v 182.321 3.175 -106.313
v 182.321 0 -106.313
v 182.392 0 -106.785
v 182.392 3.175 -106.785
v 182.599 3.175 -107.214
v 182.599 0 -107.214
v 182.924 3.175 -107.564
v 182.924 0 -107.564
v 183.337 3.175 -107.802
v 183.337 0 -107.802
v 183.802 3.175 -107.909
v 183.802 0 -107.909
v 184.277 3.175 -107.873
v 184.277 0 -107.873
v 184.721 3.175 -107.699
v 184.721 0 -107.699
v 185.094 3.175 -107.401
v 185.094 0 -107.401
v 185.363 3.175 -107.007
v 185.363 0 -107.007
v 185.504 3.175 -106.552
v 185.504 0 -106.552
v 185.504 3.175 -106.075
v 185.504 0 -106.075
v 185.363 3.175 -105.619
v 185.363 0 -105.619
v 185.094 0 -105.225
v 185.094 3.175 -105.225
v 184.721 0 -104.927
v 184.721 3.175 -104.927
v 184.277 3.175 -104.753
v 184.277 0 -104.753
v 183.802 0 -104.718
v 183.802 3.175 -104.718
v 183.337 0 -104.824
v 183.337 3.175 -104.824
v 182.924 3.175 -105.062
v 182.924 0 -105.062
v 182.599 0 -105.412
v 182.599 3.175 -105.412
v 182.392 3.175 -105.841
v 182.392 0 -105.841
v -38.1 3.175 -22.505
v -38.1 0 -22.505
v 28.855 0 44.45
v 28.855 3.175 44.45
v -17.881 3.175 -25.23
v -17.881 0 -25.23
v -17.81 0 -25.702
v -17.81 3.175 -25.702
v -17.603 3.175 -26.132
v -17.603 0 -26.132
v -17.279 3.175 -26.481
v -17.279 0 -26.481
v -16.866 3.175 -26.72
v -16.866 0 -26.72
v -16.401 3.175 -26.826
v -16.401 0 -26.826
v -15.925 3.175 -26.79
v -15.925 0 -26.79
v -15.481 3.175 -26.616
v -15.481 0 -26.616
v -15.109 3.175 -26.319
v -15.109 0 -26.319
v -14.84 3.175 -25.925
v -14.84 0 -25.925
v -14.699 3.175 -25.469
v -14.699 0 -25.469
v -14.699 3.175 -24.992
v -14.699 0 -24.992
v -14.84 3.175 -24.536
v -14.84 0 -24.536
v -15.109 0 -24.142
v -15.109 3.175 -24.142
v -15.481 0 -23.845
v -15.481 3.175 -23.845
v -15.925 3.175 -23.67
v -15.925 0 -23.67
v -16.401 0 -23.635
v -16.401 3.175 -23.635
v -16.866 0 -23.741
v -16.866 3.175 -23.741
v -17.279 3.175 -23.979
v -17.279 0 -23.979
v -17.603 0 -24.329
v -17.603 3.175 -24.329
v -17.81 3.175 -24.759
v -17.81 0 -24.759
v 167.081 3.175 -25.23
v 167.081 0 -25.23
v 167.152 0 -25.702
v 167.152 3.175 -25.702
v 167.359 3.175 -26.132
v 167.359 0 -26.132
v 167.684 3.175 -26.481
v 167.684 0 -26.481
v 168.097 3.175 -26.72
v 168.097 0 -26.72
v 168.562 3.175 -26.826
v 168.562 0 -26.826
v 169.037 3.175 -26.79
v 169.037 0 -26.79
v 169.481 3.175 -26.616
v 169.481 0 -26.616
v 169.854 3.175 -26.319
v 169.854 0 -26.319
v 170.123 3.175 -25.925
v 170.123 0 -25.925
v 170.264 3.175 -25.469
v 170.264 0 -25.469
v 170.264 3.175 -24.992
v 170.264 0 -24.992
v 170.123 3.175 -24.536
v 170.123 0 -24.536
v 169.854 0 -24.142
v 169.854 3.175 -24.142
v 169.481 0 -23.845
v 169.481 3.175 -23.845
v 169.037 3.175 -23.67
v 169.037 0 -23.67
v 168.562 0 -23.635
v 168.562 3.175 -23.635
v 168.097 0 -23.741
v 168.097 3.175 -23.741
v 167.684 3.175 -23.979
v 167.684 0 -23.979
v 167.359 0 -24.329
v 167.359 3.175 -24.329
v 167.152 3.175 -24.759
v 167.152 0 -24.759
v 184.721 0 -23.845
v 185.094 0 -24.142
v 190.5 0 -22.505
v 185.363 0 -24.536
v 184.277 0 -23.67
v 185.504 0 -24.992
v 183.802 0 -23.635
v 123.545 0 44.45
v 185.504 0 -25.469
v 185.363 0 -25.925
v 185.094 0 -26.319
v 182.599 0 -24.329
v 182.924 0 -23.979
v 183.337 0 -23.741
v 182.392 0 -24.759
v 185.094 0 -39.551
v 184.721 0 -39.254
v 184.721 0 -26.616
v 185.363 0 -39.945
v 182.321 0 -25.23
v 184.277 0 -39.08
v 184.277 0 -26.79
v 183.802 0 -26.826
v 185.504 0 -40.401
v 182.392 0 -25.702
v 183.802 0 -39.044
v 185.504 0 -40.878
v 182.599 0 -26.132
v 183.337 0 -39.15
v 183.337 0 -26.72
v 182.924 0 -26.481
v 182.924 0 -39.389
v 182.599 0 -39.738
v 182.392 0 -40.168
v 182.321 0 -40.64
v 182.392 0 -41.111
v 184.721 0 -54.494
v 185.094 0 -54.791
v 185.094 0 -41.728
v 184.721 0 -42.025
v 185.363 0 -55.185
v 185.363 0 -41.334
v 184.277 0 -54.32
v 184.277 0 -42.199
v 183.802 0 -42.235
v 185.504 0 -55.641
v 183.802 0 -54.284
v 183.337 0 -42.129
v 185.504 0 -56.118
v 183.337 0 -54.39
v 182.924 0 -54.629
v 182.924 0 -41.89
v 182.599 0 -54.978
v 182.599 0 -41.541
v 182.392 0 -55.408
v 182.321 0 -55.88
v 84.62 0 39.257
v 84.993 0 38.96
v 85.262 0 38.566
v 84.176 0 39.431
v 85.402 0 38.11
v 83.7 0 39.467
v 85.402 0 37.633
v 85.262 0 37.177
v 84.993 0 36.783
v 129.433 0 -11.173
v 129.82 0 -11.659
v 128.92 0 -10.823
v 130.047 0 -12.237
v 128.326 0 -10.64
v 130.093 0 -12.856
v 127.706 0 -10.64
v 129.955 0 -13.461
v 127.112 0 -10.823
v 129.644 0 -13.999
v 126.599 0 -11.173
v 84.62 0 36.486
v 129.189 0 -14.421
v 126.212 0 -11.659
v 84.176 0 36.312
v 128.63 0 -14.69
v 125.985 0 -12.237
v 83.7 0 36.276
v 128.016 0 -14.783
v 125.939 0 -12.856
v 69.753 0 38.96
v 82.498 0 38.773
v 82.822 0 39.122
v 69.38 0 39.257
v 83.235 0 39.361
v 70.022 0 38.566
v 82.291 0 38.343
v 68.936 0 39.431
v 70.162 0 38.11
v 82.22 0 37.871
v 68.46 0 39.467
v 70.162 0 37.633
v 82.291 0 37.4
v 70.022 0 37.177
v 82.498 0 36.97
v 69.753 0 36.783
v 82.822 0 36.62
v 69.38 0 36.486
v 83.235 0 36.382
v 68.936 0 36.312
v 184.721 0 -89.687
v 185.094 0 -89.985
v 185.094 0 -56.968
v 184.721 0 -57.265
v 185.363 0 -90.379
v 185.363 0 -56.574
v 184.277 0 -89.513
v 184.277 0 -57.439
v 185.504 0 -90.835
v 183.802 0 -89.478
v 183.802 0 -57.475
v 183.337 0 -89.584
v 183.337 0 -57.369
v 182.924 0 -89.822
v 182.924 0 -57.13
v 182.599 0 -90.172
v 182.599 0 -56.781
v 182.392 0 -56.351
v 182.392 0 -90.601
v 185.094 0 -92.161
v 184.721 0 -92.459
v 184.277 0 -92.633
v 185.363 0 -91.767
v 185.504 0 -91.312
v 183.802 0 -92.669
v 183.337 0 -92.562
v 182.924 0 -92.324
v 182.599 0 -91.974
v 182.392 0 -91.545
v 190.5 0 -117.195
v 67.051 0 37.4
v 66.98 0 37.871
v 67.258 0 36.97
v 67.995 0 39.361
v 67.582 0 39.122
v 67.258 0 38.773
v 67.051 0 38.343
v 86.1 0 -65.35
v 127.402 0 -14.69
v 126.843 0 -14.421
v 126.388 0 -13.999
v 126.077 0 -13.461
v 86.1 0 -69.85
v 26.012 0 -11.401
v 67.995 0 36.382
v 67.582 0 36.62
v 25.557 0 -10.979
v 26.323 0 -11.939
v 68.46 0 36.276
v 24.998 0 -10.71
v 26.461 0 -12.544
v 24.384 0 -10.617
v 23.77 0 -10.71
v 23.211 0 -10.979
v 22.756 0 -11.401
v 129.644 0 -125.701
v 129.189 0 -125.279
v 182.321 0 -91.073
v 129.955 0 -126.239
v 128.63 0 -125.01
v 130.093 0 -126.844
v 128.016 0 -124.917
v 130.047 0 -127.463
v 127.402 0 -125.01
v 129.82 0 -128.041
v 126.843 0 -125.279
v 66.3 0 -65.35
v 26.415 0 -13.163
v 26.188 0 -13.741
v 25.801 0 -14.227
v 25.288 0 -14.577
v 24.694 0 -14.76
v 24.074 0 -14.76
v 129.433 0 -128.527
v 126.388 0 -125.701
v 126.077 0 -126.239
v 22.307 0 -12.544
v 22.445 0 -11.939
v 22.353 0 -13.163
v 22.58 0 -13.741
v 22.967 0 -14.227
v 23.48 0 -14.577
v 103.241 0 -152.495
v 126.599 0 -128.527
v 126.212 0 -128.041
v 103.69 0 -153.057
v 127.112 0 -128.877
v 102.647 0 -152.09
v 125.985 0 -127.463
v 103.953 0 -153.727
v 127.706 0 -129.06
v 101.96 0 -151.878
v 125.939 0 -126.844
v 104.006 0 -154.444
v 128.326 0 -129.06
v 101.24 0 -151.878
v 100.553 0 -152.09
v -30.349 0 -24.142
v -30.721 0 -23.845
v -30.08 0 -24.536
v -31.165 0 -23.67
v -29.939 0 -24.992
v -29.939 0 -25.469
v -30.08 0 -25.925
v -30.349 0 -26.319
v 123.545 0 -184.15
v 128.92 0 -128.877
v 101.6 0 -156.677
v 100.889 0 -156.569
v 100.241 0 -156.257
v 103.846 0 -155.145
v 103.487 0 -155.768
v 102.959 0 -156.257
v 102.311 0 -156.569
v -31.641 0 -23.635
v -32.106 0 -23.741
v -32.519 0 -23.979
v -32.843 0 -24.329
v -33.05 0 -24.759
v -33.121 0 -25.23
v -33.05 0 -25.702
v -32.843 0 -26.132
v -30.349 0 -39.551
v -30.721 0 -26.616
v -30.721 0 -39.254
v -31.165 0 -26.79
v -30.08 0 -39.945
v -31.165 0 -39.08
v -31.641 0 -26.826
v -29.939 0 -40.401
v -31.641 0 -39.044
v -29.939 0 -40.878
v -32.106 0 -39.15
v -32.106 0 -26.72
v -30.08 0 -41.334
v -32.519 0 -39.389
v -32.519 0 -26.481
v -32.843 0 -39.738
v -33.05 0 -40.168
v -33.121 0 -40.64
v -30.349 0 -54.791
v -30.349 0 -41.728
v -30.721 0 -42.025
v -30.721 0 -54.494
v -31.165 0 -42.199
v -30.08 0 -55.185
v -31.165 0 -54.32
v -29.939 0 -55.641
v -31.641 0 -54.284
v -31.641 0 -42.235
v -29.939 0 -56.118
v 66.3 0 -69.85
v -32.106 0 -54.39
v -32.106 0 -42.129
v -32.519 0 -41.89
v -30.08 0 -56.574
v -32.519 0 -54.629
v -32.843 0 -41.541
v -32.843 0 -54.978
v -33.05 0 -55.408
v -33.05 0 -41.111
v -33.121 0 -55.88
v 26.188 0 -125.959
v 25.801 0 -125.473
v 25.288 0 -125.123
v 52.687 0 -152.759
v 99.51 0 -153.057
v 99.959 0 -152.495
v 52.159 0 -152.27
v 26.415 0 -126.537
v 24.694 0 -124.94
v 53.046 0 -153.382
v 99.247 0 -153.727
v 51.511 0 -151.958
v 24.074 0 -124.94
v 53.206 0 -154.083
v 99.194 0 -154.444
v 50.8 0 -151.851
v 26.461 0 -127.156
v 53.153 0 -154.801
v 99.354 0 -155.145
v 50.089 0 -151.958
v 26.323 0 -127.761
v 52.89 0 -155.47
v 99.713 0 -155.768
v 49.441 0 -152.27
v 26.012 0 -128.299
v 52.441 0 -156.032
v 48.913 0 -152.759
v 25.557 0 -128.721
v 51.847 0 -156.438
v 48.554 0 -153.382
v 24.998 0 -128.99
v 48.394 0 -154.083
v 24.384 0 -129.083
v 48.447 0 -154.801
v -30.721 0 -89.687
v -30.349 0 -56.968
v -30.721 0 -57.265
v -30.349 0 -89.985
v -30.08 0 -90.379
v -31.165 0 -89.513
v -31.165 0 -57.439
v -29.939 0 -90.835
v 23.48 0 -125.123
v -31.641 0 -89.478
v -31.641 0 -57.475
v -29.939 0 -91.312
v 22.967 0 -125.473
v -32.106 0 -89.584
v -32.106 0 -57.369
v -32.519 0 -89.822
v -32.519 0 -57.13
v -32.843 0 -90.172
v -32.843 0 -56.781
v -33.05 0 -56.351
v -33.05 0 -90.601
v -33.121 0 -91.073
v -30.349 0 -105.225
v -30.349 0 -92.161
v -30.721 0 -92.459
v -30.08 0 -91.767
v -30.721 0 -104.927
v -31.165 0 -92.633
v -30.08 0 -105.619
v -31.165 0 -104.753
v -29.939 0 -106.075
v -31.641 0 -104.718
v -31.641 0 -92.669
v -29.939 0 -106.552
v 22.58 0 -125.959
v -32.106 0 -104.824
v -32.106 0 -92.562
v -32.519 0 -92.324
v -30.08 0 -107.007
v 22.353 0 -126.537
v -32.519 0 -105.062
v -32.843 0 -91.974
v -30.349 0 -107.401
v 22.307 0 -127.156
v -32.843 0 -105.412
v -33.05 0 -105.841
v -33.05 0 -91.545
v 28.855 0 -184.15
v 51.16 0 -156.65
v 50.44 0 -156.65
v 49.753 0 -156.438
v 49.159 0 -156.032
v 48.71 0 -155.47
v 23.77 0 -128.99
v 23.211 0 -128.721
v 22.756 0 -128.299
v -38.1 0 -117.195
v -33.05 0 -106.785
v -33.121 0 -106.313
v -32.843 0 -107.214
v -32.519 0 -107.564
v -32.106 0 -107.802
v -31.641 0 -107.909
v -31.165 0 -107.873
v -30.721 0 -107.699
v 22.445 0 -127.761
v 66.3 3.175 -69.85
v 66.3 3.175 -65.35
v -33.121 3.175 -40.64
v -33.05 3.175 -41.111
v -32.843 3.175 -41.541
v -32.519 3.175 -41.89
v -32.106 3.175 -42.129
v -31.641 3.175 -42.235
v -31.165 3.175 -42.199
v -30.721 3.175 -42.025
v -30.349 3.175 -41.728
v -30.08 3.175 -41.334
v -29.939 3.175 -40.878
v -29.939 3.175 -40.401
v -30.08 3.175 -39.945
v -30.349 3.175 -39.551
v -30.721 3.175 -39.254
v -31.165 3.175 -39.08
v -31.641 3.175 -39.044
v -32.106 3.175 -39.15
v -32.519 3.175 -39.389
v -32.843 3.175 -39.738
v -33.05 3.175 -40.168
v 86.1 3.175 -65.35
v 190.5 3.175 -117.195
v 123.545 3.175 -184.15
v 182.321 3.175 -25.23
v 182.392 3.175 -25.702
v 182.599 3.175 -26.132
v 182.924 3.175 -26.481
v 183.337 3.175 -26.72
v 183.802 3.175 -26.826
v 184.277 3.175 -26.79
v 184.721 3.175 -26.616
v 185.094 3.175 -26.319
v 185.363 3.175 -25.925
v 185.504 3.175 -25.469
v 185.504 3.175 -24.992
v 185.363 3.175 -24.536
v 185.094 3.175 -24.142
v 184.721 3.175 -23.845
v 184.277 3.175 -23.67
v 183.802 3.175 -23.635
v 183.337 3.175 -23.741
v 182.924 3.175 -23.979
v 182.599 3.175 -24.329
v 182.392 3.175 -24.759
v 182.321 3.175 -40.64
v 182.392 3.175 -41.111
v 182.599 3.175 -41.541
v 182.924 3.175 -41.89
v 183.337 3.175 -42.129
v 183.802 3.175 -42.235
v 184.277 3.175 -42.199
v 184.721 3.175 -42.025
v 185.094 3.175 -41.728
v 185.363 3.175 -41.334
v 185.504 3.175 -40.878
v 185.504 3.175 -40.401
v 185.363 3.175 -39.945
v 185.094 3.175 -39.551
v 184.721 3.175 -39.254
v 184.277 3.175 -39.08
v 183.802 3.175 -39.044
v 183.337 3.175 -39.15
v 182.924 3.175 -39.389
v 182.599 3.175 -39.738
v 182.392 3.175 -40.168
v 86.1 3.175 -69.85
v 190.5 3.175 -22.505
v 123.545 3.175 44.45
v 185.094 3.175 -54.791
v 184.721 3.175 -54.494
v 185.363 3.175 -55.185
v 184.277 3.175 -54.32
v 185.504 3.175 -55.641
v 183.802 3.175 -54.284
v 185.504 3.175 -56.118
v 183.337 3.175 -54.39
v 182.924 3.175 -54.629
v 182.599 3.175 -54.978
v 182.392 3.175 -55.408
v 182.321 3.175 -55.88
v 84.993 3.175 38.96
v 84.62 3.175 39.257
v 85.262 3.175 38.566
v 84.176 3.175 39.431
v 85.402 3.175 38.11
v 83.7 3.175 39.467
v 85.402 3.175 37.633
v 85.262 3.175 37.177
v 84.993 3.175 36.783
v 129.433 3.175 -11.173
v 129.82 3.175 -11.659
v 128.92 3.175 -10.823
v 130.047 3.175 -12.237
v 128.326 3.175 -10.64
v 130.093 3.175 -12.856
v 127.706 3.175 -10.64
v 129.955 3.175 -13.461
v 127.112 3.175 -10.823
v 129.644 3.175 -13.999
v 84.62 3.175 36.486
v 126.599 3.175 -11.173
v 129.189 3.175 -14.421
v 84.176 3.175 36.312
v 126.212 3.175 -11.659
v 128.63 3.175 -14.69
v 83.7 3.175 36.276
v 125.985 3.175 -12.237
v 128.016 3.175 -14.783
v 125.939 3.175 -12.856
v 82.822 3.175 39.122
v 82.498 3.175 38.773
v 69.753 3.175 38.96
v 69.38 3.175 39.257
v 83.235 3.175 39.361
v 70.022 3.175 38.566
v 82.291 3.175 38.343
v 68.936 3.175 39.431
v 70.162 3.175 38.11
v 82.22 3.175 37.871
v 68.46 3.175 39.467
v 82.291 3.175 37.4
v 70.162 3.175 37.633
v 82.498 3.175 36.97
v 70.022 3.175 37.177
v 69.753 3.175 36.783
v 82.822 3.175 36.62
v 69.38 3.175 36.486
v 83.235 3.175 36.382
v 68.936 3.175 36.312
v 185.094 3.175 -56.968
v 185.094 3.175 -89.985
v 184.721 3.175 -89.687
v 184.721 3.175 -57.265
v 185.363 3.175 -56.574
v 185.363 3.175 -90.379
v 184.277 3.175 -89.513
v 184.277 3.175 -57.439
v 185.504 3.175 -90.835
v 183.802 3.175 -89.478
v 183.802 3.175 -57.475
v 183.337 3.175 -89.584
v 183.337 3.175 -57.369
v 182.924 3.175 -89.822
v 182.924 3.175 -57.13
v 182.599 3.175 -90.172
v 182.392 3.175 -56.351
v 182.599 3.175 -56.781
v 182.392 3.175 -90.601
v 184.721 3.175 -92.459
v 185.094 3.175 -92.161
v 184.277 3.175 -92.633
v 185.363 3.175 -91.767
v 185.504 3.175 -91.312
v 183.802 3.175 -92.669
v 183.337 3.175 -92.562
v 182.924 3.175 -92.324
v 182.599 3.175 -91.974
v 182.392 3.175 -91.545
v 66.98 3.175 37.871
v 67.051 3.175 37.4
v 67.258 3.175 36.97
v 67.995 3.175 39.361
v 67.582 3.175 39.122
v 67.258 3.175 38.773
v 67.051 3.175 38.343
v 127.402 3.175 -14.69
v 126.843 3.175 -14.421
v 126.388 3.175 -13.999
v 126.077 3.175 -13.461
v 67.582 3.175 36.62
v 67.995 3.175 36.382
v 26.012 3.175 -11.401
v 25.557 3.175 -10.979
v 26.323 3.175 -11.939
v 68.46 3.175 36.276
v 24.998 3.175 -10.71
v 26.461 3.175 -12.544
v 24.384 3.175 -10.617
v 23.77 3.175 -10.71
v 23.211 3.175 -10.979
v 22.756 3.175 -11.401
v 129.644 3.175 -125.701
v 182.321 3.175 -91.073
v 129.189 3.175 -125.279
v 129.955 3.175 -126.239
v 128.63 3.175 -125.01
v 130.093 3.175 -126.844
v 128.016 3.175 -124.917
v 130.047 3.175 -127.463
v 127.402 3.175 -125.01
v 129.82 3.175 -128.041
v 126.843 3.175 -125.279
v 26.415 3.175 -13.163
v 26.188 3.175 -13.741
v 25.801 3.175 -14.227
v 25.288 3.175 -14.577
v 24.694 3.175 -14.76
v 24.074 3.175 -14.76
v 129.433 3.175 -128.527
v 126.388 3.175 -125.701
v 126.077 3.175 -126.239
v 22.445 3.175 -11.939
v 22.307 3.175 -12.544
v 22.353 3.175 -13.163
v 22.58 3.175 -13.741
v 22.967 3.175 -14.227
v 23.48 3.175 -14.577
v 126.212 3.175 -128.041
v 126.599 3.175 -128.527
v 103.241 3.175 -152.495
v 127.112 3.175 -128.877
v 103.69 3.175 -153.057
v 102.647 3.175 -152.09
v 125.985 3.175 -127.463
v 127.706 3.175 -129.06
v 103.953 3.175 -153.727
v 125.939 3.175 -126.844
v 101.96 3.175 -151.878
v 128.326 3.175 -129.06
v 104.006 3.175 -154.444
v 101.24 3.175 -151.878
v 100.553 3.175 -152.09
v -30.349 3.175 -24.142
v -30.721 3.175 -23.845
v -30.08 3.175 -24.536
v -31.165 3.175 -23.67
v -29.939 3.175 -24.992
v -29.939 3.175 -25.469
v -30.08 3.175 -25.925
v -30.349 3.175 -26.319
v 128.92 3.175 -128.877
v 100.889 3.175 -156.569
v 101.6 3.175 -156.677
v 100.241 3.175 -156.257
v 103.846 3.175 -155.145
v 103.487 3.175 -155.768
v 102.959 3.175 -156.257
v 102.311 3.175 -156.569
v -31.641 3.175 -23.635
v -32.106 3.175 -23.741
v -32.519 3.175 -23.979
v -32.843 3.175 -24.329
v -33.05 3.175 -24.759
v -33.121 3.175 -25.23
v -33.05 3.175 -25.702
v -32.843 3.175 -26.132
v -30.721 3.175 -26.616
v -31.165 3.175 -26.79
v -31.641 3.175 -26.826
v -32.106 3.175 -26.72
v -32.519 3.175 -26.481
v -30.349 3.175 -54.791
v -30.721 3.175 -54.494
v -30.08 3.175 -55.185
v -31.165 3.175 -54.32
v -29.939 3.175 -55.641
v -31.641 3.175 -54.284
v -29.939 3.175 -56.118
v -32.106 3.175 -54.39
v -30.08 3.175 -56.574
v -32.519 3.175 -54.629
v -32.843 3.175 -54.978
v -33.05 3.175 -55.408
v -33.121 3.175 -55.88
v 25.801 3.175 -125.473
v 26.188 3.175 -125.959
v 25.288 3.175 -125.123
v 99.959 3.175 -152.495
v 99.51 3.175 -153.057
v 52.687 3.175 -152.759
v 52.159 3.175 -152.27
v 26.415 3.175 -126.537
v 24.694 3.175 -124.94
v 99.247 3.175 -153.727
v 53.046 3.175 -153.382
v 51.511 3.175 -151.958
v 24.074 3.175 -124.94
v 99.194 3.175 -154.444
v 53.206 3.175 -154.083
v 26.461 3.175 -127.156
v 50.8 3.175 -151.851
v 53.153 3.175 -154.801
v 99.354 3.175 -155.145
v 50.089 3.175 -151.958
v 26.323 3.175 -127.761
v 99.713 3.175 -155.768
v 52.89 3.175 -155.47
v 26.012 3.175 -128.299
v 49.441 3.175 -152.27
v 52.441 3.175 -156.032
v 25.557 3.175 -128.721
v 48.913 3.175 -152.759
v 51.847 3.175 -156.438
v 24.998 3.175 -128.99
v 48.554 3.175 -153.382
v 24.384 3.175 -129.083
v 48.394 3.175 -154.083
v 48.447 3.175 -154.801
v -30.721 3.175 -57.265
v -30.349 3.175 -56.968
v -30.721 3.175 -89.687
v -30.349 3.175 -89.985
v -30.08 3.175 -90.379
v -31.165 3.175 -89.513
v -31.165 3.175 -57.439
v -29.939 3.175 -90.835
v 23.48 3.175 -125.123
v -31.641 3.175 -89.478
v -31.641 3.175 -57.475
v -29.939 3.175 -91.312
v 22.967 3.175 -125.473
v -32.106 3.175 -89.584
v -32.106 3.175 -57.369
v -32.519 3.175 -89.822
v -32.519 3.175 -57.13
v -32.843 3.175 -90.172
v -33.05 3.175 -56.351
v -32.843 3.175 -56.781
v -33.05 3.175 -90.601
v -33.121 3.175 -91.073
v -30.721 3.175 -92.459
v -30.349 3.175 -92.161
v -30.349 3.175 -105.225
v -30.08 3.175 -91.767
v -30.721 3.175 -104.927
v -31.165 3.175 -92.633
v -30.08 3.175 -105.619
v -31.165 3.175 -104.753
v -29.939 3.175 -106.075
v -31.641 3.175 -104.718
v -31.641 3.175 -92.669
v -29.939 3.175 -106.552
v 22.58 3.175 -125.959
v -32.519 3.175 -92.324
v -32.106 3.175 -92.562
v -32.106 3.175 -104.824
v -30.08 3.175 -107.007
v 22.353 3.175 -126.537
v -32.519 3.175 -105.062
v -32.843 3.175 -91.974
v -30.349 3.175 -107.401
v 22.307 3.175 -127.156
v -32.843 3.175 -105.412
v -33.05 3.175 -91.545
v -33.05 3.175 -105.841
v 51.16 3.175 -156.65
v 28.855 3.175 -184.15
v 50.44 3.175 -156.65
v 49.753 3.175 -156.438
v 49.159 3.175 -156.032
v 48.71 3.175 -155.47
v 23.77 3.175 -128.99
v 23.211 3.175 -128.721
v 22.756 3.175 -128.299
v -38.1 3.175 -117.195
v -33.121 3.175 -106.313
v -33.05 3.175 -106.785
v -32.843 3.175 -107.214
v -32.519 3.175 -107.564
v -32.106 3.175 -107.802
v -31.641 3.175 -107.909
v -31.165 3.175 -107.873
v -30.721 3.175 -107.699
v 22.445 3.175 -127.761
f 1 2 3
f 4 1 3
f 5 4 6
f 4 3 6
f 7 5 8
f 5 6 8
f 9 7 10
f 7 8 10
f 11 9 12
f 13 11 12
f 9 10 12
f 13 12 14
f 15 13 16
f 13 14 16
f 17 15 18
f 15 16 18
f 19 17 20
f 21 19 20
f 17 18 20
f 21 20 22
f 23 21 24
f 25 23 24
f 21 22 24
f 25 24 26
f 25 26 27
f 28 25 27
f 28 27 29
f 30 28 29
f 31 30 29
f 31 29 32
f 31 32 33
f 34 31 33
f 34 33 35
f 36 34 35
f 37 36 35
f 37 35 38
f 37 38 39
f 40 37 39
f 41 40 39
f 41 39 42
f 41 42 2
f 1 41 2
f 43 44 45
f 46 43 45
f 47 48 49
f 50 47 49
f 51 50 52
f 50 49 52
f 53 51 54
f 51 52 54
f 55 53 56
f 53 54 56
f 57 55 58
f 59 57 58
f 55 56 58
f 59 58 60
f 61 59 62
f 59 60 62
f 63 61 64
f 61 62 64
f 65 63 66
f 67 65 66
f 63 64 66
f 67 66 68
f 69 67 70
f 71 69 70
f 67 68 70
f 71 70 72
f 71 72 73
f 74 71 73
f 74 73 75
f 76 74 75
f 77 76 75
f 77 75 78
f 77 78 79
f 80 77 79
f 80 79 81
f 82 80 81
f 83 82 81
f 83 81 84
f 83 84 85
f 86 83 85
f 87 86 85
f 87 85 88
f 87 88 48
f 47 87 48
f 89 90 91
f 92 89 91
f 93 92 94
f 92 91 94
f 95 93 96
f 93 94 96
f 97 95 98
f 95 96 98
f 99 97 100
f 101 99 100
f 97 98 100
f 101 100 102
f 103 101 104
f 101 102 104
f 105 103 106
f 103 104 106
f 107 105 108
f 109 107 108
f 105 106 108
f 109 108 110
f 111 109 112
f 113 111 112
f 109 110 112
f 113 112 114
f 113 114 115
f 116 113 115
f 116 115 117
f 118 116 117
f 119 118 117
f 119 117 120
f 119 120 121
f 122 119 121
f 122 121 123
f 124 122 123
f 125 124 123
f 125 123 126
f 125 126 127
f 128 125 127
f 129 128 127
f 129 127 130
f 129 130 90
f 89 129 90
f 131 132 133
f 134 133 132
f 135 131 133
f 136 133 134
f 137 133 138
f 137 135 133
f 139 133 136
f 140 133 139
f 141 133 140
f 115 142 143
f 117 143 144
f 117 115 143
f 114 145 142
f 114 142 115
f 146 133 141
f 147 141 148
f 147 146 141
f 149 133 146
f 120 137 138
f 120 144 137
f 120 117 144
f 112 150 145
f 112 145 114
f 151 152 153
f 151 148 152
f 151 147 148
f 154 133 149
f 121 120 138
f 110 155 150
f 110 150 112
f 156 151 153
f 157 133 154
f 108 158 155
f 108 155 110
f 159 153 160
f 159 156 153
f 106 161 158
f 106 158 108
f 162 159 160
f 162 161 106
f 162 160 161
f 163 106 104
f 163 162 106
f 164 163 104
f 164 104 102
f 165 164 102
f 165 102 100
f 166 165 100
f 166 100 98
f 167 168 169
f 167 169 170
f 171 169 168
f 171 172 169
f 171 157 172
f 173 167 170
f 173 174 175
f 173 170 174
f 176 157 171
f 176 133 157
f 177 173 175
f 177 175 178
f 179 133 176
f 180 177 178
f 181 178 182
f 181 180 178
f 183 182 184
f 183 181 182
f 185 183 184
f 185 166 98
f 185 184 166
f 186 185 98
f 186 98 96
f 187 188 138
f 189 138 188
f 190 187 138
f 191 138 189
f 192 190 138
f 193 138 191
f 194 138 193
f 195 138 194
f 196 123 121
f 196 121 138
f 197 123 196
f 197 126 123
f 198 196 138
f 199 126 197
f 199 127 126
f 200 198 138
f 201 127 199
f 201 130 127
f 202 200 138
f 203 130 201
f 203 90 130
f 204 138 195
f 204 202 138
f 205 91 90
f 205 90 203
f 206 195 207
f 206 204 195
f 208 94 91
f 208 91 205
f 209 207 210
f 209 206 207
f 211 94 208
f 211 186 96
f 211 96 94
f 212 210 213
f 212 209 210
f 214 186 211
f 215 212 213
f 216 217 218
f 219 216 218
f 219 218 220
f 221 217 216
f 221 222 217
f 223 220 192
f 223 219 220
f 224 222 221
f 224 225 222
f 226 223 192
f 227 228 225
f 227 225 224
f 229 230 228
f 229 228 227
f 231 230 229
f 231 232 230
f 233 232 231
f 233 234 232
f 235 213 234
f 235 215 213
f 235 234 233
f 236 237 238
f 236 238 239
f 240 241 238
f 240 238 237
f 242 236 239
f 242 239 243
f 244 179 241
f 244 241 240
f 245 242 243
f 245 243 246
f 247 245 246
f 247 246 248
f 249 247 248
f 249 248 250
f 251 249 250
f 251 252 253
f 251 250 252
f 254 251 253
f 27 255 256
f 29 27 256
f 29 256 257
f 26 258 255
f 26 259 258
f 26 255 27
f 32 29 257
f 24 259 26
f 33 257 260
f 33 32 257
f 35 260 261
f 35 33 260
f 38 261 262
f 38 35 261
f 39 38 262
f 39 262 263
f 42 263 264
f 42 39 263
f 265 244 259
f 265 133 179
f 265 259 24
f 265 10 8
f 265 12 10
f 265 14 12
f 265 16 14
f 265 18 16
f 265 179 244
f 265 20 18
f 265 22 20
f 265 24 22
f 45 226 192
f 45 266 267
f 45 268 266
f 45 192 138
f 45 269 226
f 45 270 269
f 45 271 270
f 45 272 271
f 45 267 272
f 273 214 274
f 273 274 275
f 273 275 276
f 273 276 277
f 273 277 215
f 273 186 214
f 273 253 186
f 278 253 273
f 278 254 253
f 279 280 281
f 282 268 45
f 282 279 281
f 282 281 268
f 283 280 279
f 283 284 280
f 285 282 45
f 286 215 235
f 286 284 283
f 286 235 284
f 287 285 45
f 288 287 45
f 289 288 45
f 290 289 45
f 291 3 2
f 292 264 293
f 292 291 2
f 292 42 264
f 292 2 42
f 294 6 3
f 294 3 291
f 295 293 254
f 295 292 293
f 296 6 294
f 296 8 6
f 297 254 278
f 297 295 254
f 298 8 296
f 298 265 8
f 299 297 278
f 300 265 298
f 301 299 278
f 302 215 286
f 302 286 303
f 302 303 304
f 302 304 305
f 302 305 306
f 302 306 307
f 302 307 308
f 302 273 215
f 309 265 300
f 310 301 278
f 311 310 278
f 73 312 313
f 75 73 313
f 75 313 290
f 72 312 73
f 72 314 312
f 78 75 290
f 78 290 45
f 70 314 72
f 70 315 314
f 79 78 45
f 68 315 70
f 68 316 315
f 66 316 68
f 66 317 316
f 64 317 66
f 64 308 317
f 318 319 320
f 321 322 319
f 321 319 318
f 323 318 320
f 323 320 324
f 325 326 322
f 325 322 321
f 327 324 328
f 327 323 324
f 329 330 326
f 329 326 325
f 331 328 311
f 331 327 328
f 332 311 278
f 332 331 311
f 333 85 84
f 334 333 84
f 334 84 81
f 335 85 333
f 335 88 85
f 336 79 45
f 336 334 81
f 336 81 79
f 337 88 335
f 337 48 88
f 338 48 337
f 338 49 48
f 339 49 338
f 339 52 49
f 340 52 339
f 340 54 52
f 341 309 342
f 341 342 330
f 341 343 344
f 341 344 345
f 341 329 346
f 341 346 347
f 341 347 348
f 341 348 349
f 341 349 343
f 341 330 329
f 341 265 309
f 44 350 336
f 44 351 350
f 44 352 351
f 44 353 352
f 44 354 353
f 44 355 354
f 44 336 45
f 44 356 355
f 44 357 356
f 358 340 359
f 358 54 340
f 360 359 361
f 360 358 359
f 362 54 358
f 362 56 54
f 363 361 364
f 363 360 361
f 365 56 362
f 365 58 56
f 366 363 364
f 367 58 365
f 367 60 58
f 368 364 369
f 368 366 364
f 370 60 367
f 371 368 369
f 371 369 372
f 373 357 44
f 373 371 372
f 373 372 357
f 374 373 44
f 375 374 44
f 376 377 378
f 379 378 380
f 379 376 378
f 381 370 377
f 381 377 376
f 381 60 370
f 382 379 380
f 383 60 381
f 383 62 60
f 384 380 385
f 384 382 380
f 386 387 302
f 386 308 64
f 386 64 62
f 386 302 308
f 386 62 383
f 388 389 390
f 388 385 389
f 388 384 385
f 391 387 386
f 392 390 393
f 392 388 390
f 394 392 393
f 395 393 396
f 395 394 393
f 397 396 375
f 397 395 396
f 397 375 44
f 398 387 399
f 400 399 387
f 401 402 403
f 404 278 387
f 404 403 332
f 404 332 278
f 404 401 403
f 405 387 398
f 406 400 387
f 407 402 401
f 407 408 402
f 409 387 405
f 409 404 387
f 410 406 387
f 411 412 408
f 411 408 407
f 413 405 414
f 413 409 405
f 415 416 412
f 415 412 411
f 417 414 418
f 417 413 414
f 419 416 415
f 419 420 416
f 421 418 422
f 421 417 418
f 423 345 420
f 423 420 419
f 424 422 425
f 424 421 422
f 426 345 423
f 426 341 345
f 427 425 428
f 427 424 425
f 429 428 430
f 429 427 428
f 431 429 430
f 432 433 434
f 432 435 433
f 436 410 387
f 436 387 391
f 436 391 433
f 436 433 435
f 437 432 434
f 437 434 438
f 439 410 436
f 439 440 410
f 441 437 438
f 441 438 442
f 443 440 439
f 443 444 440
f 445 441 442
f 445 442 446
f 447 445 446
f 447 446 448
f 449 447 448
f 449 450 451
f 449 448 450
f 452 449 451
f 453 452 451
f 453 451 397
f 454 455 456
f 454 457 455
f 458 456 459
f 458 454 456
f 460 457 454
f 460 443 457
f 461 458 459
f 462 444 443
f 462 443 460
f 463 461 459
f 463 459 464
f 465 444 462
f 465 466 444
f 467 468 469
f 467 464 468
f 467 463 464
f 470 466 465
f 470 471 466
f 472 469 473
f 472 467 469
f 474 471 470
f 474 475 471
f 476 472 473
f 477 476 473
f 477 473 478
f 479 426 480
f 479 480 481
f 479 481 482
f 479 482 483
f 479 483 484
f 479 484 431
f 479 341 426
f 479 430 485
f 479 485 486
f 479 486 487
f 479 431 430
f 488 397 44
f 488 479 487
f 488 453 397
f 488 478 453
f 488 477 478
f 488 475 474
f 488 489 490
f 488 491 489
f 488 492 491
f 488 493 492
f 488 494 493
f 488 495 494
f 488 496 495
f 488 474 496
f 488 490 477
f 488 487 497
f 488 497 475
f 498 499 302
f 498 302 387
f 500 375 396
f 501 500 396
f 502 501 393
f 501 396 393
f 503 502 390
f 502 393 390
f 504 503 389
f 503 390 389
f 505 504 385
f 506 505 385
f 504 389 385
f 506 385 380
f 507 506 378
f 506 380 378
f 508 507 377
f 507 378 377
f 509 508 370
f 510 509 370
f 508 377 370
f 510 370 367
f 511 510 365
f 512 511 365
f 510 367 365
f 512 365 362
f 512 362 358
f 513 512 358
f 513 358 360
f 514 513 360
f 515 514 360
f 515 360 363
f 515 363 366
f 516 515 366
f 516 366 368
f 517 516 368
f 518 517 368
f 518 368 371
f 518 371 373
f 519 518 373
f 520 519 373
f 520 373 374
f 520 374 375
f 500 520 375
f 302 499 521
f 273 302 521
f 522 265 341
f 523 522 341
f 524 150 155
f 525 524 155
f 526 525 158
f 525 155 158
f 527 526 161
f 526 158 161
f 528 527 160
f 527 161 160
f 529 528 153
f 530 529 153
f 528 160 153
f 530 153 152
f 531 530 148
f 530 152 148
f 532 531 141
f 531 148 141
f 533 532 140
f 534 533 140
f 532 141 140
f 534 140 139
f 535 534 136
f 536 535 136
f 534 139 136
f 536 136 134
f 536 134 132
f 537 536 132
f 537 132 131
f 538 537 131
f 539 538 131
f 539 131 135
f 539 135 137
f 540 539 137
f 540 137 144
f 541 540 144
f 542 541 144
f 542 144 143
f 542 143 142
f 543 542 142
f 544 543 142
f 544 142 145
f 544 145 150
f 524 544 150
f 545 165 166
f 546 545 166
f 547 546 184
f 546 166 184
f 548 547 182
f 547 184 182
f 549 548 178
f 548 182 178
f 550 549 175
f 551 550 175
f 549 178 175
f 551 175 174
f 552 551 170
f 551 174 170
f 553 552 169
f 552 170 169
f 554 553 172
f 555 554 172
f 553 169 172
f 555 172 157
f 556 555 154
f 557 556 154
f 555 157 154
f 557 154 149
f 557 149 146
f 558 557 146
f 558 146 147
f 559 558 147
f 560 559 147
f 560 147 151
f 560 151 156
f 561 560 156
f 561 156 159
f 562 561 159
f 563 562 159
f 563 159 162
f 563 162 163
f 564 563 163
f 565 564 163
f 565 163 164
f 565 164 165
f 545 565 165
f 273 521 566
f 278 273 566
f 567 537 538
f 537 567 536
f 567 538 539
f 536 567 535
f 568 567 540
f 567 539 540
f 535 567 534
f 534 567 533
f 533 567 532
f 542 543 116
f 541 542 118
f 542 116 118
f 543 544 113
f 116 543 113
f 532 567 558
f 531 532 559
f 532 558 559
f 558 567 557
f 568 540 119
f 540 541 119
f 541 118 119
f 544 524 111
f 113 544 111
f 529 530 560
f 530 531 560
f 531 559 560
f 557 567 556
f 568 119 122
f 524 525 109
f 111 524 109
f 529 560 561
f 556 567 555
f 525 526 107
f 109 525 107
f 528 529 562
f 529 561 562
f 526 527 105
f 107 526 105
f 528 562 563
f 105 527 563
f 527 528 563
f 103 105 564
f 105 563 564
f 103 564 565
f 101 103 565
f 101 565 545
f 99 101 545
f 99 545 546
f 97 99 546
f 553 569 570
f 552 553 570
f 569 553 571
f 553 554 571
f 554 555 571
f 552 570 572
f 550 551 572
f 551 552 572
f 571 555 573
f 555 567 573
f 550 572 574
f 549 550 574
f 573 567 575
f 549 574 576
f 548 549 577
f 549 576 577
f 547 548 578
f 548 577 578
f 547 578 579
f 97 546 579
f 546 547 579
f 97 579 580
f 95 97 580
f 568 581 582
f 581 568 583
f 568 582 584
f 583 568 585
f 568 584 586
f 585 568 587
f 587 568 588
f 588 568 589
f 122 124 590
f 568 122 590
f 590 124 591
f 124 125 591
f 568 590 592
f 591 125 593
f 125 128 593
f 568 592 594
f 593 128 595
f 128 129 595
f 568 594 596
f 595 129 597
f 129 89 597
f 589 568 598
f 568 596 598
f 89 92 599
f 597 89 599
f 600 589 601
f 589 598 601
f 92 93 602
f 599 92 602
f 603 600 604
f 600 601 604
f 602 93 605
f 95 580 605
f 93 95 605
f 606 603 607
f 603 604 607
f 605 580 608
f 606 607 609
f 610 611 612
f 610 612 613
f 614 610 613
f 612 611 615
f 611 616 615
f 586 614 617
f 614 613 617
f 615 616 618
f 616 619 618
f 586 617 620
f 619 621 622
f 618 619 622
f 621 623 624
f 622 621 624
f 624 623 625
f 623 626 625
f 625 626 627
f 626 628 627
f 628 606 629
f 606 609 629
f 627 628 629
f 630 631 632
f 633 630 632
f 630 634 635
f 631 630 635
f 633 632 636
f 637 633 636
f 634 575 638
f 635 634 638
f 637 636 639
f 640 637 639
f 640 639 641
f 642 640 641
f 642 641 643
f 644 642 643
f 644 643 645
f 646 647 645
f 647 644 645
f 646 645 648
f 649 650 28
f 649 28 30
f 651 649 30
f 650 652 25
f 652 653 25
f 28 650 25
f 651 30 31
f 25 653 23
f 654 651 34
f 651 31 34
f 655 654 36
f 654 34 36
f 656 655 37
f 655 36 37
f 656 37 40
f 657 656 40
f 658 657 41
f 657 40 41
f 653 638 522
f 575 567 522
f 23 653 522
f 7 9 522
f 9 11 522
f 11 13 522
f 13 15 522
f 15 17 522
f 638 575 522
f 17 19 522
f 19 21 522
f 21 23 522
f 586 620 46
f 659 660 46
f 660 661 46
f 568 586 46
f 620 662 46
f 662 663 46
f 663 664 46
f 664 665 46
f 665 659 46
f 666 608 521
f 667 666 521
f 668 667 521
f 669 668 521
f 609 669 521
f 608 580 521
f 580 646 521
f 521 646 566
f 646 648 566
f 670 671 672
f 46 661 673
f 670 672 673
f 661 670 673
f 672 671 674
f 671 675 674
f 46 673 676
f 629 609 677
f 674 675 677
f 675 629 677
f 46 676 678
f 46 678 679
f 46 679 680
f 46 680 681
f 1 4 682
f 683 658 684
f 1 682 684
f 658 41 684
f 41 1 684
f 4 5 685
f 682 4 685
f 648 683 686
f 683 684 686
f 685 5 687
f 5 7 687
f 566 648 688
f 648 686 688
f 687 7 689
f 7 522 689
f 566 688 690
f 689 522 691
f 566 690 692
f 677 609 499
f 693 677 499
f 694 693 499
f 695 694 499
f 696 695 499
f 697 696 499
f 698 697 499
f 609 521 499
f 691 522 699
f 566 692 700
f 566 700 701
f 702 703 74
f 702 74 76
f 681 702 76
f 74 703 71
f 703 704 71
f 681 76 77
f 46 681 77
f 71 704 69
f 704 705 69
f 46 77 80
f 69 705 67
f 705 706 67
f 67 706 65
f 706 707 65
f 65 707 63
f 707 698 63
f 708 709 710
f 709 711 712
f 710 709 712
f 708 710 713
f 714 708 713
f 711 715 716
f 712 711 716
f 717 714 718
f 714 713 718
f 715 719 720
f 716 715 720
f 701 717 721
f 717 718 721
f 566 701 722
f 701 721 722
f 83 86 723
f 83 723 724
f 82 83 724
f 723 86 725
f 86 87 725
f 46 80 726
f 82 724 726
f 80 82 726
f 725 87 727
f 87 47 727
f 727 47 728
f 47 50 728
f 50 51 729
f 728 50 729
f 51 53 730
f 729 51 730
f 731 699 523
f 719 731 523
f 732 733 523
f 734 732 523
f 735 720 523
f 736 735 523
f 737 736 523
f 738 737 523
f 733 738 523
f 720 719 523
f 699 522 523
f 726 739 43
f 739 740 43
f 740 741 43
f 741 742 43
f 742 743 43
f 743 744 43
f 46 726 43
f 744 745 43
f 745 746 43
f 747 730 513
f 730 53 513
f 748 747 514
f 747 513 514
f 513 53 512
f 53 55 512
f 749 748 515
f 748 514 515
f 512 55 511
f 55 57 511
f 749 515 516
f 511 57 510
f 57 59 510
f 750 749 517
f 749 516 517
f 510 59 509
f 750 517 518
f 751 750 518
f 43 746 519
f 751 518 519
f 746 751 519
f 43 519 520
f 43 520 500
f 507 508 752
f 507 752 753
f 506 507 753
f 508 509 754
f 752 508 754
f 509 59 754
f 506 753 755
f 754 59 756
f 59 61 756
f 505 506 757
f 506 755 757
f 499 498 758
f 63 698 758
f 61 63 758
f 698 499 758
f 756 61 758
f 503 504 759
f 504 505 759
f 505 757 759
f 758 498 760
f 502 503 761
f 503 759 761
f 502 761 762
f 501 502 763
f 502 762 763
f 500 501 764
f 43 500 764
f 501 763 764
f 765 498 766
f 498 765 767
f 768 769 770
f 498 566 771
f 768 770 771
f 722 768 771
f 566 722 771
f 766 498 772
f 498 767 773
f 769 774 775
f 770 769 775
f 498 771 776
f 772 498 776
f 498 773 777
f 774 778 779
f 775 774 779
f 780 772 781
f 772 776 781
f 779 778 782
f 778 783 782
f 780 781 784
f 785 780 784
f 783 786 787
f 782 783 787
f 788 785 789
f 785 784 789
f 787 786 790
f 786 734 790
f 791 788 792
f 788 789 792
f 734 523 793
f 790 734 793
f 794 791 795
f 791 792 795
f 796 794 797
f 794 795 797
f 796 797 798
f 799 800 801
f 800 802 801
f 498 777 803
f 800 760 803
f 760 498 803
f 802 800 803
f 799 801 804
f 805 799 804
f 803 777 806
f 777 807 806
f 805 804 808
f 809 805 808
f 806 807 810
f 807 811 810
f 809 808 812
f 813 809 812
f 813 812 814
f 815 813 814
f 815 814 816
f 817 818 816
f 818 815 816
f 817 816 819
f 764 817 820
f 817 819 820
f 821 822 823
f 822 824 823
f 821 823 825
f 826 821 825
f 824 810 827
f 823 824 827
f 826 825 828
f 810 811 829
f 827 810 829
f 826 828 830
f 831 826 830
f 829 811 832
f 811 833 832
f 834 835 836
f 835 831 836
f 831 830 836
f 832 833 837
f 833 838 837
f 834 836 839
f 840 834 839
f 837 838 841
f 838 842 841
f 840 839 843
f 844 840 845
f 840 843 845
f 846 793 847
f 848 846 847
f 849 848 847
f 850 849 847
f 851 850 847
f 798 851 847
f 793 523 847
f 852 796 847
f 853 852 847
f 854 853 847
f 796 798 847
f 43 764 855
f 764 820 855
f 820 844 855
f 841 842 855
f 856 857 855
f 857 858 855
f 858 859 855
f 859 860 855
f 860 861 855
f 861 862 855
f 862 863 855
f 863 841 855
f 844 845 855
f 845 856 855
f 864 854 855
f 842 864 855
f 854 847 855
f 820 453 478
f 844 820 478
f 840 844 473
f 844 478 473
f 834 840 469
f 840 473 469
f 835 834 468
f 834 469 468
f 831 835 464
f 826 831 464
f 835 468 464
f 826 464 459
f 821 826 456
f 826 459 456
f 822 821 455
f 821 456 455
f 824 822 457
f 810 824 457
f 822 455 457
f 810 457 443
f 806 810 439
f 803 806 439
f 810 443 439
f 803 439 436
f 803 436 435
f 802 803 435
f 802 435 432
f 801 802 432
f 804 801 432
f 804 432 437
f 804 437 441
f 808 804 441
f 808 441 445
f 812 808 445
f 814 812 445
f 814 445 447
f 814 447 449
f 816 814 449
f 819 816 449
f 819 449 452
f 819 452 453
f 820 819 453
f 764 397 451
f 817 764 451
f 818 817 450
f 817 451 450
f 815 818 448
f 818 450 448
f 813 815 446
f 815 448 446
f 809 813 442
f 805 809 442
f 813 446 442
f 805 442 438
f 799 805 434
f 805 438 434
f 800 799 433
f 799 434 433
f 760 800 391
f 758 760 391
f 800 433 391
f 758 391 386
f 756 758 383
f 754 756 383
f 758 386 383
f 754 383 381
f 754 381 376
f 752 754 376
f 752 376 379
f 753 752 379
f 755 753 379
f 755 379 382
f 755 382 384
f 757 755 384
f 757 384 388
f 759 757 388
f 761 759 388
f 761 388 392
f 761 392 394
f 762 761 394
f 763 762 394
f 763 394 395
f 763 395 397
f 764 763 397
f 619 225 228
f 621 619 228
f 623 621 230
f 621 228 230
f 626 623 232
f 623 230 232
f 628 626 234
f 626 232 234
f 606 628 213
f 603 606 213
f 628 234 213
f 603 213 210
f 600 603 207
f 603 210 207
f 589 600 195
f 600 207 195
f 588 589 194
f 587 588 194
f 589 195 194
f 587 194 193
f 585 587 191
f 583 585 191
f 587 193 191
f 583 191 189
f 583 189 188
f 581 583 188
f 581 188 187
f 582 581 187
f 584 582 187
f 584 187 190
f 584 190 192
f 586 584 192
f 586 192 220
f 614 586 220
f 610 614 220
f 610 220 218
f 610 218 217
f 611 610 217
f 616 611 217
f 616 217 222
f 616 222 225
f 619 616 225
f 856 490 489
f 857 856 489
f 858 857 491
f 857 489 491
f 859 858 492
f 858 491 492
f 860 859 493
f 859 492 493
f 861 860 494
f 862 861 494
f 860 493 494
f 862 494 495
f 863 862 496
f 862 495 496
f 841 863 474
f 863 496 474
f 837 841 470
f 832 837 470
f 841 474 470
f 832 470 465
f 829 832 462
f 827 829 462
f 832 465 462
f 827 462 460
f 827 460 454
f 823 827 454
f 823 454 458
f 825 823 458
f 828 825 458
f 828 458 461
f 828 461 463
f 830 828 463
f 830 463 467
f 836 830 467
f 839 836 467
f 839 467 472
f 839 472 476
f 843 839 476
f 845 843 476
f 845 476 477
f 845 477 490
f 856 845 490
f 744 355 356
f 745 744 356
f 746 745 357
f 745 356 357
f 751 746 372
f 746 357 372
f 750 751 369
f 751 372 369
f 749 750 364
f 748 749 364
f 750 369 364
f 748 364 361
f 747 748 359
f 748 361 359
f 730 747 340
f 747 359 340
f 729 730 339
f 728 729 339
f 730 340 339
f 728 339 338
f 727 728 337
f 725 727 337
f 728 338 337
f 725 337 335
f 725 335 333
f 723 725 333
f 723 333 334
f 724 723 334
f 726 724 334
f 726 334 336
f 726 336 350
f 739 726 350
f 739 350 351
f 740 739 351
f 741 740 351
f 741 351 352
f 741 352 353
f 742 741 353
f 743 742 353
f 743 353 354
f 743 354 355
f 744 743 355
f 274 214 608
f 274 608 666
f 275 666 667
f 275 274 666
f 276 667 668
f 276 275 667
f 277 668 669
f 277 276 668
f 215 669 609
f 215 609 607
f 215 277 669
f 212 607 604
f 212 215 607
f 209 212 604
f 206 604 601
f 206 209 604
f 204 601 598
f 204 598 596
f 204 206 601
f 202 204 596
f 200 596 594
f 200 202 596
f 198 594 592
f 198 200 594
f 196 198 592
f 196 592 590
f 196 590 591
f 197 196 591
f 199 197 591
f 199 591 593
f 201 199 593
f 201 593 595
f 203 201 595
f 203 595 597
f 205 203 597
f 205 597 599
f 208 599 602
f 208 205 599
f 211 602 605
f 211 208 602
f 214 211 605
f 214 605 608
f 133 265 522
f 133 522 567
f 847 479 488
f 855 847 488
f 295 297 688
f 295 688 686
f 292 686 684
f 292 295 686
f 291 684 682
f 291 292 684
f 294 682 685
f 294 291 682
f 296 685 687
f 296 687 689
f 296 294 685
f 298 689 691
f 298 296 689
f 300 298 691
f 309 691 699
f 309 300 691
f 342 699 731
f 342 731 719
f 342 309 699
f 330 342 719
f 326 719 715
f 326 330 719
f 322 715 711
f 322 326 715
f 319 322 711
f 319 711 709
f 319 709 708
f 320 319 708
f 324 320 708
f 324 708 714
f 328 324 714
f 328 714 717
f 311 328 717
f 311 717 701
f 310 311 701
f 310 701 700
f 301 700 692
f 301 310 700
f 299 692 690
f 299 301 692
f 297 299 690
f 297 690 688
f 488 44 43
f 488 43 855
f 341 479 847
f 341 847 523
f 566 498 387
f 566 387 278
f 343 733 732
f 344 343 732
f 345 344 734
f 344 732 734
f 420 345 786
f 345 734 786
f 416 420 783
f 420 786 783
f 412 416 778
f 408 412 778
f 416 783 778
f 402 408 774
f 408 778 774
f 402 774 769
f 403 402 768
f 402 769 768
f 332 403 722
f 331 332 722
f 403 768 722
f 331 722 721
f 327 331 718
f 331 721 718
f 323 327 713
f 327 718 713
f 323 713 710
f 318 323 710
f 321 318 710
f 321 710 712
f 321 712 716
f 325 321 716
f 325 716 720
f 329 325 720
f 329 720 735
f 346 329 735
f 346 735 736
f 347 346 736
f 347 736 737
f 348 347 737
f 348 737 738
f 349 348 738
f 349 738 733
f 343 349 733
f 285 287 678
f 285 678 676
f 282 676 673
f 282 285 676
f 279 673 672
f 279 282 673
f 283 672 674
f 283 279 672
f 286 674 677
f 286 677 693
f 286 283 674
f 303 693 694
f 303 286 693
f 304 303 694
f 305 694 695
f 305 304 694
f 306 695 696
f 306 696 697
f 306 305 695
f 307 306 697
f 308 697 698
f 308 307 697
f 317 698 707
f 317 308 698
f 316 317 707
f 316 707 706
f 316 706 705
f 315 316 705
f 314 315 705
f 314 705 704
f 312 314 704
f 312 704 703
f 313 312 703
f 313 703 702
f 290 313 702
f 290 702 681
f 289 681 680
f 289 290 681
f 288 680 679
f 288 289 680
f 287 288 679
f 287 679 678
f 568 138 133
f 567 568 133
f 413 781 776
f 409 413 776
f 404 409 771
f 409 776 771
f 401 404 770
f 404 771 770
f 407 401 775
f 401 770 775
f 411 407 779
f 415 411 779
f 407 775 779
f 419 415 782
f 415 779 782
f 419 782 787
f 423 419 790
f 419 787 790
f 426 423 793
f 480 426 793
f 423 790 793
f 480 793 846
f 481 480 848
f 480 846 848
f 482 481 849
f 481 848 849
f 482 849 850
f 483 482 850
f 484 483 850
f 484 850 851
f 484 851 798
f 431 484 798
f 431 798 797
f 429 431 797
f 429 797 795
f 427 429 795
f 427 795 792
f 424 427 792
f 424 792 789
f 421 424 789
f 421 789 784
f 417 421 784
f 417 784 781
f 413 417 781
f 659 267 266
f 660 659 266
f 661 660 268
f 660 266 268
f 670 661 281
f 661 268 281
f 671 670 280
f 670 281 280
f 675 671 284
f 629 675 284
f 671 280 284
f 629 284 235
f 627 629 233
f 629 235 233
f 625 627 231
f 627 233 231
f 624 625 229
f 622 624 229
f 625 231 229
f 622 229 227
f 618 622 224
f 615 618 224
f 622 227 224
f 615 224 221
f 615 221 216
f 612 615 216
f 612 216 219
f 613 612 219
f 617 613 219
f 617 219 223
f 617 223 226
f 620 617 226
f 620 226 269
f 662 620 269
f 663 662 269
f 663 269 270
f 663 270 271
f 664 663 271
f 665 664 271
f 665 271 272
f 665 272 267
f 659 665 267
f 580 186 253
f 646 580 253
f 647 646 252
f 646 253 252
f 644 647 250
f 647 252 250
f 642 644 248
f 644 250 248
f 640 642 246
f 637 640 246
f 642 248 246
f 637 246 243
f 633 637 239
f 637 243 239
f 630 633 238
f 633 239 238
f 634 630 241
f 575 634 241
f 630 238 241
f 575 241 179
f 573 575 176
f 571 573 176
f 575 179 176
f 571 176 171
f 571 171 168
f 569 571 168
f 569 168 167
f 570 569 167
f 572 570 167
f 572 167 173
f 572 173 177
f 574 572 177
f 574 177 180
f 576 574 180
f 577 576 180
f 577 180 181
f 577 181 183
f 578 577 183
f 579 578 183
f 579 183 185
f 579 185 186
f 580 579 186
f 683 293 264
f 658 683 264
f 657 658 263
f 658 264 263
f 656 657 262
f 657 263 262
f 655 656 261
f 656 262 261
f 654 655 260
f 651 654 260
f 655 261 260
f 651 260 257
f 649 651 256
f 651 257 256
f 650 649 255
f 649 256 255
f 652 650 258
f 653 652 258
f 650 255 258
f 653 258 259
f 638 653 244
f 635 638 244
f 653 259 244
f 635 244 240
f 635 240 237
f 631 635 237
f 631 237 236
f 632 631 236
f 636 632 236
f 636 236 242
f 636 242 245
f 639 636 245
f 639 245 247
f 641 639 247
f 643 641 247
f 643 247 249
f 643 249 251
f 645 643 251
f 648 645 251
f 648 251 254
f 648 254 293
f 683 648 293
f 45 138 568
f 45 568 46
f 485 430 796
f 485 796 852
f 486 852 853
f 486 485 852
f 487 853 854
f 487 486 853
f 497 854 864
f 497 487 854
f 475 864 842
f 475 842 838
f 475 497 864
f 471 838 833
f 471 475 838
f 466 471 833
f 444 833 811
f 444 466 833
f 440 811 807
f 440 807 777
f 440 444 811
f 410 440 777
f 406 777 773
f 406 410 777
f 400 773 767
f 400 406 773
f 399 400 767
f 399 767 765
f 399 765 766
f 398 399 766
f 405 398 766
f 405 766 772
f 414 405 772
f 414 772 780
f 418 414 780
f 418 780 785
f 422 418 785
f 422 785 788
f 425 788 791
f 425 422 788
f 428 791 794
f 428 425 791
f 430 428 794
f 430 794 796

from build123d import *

# Parameters (mm, degrees)
SKETCH1_R            = 2.0828
BOSS_EXTRUDE1_DEPTH  = 3.175
M3_CLEARANCE_HOLE1_D = 3.2
SKETCH5_W            = 19.8
SKETCH5_H            = 4.5
CUT_EXTRUDE1_DEPTH   = 265.974627323
SKETCH7_R            = 2.413
CUT_EXTRUDE2_DEPTH   = 265.974627323


with BuildPart() as part:
    # Sketch1 → Boss-Extrude1 (new body)
    with BuildSketch(Plane(origin=(0, 0, 0), x_dir=(1, 0, 0), z_dir=(0, 1, 0))):
        Polygon((28.855389821, 184.15), (123.544610179, 184.15), (176.5, 131.194610179), (182.5, 125.194610179), (190.5, 117.194610179), (190.5, 22.505389821), (182.5, 14.505389821), (176.5, 8.505389821), (137.544610179, -30.45), (131.544610179, -36.45), (123.544610179, -44.45), (28.855389821, -44.45), (20.855389821, -36.45), (14.855389821, -30.45), (-24.1, 8.505389821), (-30.1, 14.505389821), (-38.1, 22.505389821), (-38.1, 117.194610179), (-30.1, 125.194610179), (-24.1, 131.194610179), align=None)
        with Locations(Location((24.384, 12.7, 0), (0, 0, 270))):
            Circle(SKETCH1_R, mode=Mode.SUBTRACT)
        with Locations(Location((128.016, 12.7, 0), (0, 0, 90))):
            Circle(SKETCH1_R, mode=Mode.SUBTRACT)
        with Locations(Location((128.016, 127, 0), (0, 0, 270))):
            Circle(SKETCH1_R, mode=Mode.SUBTRACT)
        with Locations(Location((24.384, 127, 0), (0, 0, 90))):
            Circle(SKETCH1_R, mode=Mode.SUBTRACT)
    extrude(amount=BOSS_EXTRUDE1_DEPTH)

    # M3 Clearance Hole1 (through all)
    with Locations(Plane(origin=(0, 3.175, 0), x_dir=(1, 0, 0), z_dir=(0, 1, 0))):
        with Locations((-31.5214, 106.313101446), (-31.5214, 91.073101446), (-31.5214, 55.8795536), (-31.5214, 40.6395536), (-31.5214, 25.230335162), (-16.2814, 25.230335162), (68.58, -37.8714), (83.82, -37.8714), (183.9214, 25.230335162), (168.6814, 25.230335162), (183.9214, 40.6395536), (183.9214, 55.8795536), (183.9214, 91.073101446), (183.9214, 106.313101446)):
            Hole(M3_CLEARANCE_HOLE1_D / 2)

    # Sketch5 → Cut-Extrude1 (cut, through all)
    with BuildSketch(Plane(origin=(0, 3.175, 0), x_dir=(1, 0, 0), z_dir=(0, 1, 0))):
        with Locations((76.2, 67.6)):
            Rectangle(SKETCH5_W, SKETCH5_H)
    extrude(amount=-CUT_EXTRUDE1_DEPTH, mode=Mode.SUBTRACT)

    # Sketch7 → Cut-Extrude2 (cut, through all)
    with BuildSketch(Plane(origin=(0, 3.175, 0), x_dir=(1, 0, 0), z_dir=(0, 1, 0))):
        with Locations(Location((50.8, 154.263560488, 0), (0, 0, 270))):
            Circle(SKETCH7_R)
        with Locations(Location((101.6, 154.263560488, 0), (0, 0, 90))):
            Circle(SKETCH7_R)
    extrude(amount=-CUT_EXTRUDE2_DEPTH, mode=Mode.SUBTRACT)


solid = part.part
